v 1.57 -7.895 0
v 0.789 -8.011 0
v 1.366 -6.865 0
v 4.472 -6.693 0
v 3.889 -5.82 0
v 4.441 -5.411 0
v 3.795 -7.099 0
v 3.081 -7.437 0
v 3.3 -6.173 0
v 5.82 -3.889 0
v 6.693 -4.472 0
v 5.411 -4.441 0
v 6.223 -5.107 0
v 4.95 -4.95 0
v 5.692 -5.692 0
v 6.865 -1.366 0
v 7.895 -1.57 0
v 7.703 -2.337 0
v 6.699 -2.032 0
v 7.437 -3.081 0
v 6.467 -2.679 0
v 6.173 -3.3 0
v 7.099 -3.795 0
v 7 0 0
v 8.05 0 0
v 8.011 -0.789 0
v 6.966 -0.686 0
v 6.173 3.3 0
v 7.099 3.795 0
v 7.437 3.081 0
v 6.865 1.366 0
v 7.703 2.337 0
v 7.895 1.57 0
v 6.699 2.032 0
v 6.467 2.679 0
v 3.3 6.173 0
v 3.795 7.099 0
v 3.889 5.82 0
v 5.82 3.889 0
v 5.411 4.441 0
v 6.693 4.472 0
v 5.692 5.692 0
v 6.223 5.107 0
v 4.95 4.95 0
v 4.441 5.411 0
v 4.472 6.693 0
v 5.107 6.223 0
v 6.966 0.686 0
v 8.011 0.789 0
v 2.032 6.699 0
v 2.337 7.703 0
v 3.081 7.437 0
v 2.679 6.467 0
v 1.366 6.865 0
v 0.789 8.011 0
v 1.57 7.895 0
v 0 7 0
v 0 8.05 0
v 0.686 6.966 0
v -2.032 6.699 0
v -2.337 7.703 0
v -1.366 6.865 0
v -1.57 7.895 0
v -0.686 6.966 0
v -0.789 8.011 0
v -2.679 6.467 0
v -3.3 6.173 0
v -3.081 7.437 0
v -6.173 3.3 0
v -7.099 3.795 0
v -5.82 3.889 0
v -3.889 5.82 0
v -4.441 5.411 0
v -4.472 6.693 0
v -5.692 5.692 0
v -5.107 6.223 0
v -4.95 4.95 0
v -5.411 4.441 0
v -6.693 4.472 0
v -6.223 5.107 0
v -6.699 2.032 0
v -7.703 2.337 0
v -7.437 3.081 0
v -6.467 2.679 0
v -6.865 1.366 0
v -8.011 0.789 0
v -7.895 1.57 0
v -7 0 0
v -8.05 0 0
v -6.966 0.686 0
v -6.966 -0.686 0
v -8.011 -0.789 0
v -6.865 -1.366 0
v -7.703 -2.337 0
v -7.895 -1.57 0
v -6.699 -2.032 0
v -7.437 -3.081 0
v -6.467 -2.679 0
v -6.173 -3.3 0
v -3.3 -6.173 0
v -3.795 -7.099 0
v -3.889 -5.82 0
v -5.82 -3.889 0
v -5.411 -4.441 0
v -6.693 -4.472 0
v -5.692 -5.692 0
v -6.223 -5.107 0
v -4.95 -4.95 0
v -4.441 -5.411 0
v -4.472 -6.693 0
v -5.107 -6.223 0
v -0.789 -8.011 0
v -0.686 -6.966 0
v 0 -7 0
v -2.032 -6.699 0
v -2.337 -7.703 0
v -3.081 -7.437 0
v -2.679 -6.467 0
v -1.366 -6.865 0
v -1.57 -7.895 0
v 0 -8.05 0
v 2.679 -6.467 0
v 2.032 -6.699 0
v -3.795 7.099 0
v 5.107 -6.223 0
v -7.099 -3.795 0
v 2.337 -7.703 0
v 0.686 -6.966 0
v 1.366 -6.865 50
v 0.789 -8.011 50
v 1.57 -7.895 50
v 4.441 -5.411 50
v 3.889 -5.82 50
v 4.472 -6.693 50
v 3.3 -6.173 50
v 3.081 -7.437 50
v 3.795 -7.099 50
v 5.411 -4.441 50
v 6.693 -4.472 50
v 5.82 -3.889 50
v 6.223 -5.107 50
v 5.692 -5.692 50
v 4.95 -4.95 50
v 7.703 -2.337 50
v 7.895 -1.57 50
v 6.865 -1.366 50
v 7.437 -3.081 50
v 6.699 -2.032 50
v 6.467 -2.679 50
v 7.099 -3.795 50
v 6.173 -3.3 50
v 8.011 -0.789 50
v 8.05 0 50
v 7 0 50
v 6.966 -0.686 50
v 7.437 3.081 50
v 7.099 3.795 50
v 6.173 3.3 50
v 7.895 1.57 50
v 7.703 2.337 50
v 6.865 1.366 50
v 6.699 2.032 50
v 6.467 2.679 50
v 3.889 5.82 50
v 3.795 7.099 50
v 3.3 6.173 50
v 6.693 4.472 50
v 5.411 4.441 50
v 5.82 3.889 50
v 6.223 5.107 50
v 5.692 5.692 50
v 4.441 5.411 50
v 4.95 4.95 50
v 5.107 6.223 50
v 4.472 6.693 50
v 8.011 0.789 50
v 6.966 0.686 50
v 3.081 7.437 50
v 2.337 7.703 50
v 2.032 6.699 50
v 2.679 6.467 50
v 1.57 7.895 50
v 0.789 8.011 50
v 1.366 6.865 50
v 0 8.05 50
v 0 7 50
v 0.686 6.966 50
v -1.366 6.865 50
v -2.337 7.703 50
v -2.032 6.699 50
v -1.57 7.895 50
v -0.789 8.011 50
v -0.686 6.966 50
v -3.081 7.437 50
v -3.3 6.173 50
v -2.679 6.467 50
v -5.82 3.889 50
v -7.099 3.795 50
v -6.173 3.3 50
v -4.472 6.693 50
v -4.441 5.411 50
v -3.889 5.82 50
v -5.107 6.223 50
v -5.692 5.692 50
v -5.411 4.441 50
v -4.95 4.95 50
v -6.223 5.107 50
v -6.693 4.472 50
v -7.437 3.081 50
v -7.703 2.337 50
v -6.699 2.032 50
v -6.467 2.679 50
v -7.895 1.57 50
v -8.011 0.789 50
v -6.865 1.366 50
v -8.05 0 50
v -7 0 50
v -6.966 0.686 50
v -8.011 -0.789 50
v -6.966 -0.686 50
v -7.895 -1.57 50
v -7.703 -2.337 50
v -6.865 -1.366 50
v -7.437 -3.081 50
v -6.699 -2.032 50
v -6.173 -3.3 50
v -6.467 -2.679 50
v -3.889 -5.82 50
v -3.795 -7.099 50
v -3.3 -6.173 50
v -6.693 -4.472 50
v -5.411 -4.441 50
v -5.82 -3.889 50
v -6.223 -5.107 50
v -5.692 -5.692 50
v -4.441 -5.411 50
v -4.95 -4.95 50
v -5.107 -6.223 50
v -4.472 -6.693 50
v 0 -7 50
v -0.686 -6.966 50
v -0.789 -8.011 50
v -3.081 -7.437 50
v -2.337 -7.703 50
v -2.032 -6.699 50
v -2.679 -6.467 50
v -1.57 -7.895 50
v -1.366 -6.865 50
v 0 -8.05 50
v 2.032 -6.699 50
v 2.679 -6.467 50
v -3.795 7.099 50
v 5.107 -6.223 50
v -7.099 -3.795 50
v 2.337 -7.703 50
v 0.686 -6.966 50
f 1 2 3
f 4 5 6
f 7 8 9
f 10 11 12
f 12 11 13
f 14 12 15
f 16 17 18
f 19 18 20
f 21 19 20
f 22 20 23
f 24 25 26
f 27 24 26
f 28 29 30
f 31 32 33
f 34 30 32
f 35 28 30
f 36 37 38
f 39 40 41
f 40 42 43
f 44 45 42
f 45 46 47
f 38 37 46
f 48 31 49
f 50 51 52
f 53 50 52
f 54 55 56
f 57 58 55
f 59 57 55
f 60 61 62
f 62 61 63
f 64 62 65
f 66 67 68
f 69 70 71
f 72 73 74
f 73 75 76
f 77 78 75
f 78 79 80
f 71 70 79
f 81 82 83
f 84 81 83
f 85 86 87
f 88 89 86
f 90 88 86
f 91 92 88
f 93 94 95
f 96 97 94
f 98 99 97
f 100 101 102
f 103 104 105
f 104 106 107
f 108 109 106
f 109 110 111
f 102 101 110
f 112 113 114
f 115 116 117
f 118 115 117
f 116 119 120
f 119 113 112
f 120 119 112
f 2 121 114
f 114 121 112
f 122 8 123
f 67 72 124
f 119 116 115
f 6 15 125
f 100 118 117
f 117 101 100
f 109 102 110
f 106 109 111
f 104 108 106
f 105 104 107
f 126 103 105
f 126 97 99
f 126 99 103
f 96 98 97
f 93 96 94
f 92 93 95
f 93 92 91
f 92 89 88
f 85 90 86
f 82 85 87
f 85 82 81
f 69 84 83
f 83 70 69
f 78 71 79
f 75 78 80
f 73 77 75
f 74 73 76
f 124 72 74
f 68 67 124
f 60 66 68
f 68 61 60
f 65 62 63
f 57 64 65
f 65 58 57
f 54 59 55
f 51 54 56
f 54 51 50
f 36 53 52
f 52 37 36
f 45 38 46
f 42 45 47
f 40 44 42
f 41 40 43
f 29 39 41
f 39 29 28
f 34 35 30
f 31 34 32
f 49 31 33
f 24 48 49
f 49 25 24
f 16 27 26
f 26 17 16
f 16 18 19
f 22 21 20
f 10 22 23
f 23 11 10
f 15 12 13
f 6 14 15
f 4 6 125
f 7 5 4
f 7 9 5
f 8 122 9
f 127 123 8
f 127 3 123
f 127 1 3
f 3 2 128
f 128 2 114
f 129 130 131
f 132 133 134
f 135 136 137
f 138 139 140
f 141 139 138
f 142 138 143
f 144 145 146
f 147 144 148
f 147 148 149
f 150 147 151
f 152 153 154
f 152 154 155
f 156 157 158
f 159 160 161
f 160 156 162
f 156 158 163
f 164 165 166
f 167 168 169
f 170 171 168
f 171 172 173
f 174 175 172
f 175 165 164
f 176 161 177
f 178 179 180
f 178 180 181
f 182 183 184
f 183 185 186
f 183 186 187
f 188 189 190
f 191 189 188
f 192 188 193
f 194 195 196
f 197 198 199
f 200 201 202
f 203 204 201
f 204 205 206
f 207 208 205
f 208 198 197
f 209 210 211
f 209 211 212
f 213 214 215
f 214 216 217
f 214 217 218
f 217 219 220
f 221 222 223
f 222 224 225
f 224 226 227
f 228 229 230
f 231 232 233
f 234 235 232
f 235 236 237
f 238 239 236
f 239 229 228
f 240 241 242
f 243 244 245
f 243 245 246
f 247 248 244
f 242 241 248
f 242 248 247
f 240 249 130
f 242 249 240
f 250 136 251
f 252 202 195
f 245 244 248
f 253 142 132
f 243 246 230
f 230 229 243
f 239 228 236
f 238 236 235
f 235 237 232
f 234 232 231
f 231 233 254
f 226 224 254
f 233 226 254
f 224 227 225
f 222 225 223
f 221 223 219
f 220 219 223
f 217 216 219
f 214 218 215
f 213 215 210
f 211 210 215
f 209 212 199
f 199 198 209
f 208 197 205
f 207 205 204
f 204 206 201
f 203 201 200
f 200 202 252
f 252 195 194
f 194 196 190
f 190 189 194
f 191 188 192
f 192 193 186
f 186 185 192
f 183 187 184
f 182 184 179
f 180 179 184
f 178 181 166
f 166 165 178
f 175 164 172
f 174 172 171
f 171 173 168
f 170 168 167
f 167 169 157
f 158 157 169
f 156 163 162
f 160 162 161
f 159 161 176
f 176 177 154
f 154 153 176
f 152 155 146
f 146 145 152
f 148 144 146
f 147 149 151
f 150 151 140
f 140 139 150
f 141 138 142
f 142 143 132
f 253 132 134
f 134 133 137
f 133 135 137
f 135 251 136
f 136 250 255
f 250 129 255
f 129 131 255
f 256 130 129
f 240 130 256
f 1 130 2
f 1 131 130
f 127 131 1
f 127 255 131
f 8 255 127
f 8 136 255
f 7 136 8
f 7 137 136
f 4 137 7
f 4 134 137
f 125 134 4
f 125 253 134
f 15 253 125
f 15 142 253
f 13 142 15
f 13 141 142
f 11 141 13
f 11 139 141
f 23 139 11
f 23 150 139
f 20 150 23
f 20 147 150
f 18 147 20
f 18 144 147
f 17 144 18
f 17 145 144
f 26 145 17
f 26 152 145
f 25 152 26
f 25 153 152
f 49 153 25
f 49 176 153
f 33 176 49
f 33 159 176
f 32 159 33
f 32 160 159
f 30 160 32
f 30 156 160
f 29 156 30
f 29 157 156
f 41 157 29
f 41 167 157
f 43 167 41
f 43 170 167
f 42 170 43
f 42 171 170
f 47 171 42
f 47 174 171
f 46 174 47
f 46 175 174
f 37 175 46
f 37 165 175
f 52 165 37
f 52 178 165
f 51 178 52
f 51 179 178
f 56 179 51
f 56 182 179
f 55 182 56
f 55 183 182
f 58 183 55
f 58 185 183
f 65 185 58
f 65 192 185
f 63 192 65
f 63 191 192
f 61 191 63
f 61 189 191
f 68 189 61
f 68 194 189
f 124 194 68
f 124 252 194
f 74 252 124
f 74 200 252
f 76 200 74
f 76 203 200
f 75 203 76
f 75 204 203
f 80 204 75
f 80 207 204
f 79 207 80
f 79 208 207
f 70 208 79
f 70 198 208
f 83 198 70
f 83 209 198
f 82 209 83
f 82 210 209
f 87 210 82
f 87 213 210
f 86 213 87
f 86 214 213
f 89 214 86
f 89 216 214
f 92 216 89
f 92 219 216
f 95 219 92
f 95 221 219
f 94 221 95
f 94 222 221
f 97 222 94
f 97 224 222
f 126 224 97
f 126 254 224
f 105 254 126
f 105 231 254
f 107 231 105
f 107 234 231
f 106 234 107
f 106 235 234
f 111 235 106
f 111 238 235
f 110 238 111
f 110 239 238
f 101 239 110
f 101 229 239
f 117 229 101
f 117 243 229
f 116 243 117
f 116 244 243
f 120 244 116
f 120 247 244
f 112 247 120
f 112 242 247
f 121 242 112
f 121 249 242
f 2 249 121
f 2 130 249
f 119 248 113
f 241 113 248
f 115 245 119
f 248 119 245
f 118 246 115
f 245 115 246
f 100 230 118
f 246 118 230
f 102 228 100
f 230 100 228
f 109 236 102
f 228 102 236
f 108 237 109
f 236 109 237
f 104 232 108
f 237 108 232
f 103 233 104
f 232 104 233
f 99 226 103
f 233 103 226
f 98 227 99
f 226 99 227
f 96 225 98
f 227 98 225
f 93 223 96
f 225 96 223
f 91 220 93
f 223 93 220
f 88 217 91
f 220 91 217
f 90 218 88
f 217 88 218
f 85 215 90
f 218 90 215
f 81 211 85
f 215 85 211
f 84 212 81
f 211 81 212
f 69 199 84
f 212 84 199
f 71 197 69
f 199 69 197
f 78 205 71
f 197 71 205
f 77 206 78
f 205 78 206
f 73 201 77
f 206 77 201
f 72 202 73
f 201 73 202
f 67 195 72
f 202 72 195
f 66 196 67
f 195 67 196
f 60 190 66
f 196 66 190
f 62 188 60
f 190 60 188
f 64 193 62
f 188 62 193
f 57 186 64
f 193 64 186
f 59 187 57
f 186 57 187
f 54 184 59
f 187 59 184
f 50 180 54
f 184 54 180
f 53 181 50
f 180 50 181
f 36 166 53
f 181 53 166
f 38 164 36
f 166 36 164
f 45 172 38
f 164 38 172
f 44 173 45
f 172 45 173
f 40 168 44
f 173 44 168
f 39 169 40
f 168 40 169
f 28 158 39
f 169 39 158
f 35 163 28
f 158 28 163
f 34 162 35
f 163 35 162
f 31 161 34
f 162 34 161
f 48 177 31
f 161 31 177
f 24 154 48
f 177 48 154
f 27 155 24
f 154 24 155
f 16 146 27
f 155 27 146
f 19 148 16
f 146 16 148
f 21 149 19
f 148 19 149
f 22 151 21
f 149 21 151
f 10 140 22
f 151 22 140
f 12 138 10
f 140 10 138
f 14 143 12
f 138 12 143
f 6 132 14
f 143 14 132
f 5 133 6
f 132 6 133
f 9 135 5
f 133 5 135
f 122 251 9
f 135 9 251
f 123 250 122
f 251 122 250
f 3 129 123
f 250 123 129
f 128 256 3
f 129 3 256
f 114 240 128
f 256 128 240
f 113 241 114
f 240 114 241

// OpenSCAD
$fn = 64;

PvcTube();

module PvcTube(l = 50, center) {
    linear_extrude(l, center=center) {
        difference() {
            circle(d = 16.1);
            circle(d = 14);
        }
    }
}
